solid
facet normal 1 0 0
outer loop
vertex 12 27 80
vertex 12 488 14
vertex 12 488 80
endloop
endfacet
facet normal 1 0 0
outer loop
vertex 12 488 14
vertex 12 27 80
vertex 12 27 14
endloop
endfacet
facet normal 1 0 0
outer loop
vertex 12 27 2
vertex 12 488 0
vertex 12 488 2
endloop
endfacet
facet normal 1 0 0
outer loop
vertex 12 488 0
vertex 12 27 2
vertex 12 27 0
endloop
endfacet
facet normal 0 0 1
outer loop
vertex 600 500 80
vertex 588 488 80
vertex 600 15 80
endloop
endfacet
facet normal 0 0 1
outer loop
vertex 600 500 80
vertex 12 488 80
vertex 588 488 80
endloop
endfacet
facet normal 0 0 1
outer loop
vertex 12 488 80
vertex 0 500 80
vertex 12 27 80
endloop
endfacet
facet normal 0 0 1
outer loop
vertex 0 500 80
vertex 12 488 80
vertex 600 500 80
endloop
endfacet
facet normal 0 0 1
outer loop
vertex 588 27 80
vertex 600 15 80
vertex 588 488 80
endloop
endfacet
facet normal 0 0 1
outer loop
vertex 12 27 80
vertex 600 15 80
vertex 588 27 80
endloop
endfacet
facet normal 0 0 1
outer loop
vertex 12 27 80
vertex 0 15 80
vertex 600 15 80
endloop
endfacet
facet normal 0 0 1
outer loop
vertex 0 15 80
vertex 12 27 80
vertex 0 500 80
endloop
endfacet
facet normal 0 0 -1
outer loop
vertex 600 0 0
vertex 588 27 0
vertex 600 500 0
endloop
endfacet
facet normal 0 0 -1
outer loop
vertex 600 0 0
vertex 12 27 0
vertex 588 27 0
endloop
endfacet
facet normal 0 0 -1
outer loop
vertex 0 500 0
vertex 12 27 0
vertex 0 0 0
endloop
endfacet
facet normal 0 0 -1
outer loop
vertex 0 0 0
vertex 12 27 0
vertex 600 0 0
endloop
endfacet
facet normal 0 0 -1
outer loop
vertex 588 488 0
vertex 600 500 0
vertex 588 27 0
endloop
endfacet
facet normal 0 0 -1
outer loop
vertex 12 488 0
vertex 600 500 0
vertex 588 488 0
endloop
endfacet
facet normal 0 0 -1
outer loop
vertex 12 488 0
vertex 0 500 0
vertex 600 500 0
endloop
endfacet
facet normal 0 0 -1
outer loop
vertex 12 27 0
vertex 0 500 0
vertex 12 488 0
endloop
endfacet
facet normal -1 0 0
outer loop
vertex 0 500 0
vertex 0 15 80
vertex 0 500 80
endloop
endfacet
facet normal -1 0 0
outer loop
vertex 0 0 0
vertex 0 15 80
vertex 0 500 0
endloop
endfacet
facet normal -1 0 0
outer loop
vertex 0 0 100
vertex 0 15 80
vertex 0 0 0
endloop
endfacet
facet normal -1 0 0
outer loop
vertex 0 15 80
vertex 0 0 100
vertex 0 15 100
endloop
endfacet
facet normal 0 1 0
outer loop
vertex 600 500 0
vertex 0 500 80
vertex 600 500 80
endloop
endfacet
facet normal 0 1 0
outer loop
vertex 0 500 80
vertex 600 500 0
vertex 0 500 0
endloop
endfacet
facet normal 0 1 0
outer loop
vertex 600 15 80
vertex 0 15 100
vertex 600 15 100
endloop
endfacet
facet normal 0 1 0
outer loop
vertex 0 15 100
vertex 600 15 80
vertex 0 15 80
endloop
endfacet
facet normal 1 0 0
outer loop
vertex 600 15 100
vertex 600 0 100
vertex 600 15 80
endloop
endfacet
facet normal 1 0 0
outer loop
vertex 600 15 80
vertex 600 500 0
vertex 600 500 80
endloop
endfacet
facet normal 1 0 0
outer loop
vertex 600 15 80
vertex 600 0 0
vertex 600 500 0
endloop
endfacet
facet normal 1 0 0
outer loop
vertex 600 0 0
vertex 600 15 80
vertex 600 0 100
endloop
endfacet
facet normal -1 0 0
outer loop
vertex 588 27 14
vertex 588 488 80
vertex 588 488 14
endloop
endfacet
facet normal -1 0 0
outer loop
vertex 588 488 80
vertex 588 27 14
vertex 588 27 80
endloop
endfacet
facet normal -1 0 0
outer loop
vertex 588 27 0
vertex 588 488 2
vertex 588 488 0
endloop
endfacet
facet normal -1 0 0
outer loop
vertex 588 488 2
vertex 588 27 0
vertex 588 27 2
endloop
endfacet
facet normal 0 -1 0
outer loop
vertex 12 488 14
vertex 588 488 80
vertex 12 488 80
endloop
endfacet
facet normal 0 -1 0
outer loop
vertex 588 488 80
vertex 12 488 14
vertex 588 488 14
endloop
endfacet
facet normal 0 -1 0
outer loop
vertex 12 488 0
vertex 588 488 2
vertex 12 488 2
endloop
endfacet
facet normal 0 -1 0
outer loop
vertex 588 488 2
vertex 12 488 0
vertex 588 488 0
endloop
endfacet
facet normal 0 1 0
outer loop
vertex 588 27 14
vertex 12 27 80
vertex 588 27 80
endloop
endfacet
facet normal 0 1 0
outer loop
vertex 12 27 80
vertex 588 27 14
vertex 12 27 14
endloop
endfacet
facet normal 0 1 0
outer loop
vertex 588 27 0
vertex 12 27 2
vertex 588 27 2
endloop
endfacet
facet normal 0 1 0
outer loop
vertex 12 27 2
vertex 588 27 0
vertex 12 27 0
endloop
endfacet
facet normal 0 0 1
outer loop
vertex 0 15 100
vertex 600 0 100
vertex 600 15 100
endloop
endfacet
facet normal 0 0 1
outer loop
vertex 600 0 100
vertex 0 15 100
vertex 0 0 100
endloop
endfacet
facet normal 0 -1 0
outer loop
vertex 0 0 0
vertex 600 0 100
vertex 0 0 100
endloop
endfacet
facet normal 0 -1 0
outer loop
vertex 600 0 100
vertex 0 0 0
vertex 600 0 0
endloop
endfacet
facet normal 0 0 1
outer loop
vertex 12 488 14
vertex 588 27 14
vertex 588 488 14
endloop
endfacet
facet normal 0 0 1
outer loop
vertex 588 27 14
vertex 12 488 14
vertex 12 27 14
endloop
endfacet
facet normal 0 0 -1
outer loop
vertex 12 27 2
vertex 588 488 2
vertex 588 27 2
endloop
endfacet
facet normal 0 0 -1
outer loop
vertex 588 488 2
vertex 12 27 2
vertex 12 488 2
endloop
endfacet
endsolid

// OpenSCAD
/*

    Sliding Shelf
    
    By Anton Augustsson


*/

// use dovtail library

module slidingShelf (
    thicknessBottom,
    thicknessSide,
    thicknessFront,
    lenghtShelf,
    widthShelf,
    heightShelf,
    xShelf,yShelf,zShelf,
    yRotate
    ){
/*
    ---------- Local varibles ---------- 
*/

length = lenghtShelf;
width  = widthShelf;
height = 100;
heightSide = height-20;

x=xShelf;
y=yShelf;
z=zShelf;

/*
    ---------- Code ---------- 
*/

translate([
    x,
    y,
    z]) 
union () {

// Left
color("Wheat")
translate([
    0,
    thicknessFront,
    0]) 
cube(size = [
    thicknessSide,
    length-thicknessFront,
    heightSide]);

// Right
color("Wheat")
translate([
    width-thicknessSide,
    thicknessFront,
    0]) 
cube(size = [
    thicknessSide,
    length-thicknessFront,
    heightSide]);
    
// Back
color("Wheat")
translate([
    thicknessSide,
    length-thicknessSide,
    0]) 
cube(size = [
    width-thicknessSide*2,
    thicknessSide,
    heightSide]);

// Front
color("BurlyWood")
translate([
    thicknessSide,
    thicknessFront,
    0]) 
cube(size = [
    width-thicknessSide*2,
    thicknessSide,
    heightSide]);    

// Front face
color("BurlyWood")
translate([
    0,
    0,
    0]) 
cube(size = [
    width,
    thicknessFront,
    height]);    

// Bottom 
color("Wheat")
translate([
    thicknessSide,
    thicknessFront+thicknessSide,
    2]) 
cube(size = [
    width-thicknessSide*2,
    length-thicknessFront-thicknessSide*2,
    thicknessBottom]);

}}
    
/*
    ---------- Example ---------- 
*/


thicknessBottom = 12;
thicknessSide   = 12;
thicknessFront  = 15;

length = 500;
width  = 600;
height = 100;


x=0;
y=0;
z=0;
yRotate=0;

slidingShelf  (
    thicknessBottom,
    thicknessSide,
    thicknessFront,
    length,
    width,
    height,
    x,y,z,
    yRotate
    );
